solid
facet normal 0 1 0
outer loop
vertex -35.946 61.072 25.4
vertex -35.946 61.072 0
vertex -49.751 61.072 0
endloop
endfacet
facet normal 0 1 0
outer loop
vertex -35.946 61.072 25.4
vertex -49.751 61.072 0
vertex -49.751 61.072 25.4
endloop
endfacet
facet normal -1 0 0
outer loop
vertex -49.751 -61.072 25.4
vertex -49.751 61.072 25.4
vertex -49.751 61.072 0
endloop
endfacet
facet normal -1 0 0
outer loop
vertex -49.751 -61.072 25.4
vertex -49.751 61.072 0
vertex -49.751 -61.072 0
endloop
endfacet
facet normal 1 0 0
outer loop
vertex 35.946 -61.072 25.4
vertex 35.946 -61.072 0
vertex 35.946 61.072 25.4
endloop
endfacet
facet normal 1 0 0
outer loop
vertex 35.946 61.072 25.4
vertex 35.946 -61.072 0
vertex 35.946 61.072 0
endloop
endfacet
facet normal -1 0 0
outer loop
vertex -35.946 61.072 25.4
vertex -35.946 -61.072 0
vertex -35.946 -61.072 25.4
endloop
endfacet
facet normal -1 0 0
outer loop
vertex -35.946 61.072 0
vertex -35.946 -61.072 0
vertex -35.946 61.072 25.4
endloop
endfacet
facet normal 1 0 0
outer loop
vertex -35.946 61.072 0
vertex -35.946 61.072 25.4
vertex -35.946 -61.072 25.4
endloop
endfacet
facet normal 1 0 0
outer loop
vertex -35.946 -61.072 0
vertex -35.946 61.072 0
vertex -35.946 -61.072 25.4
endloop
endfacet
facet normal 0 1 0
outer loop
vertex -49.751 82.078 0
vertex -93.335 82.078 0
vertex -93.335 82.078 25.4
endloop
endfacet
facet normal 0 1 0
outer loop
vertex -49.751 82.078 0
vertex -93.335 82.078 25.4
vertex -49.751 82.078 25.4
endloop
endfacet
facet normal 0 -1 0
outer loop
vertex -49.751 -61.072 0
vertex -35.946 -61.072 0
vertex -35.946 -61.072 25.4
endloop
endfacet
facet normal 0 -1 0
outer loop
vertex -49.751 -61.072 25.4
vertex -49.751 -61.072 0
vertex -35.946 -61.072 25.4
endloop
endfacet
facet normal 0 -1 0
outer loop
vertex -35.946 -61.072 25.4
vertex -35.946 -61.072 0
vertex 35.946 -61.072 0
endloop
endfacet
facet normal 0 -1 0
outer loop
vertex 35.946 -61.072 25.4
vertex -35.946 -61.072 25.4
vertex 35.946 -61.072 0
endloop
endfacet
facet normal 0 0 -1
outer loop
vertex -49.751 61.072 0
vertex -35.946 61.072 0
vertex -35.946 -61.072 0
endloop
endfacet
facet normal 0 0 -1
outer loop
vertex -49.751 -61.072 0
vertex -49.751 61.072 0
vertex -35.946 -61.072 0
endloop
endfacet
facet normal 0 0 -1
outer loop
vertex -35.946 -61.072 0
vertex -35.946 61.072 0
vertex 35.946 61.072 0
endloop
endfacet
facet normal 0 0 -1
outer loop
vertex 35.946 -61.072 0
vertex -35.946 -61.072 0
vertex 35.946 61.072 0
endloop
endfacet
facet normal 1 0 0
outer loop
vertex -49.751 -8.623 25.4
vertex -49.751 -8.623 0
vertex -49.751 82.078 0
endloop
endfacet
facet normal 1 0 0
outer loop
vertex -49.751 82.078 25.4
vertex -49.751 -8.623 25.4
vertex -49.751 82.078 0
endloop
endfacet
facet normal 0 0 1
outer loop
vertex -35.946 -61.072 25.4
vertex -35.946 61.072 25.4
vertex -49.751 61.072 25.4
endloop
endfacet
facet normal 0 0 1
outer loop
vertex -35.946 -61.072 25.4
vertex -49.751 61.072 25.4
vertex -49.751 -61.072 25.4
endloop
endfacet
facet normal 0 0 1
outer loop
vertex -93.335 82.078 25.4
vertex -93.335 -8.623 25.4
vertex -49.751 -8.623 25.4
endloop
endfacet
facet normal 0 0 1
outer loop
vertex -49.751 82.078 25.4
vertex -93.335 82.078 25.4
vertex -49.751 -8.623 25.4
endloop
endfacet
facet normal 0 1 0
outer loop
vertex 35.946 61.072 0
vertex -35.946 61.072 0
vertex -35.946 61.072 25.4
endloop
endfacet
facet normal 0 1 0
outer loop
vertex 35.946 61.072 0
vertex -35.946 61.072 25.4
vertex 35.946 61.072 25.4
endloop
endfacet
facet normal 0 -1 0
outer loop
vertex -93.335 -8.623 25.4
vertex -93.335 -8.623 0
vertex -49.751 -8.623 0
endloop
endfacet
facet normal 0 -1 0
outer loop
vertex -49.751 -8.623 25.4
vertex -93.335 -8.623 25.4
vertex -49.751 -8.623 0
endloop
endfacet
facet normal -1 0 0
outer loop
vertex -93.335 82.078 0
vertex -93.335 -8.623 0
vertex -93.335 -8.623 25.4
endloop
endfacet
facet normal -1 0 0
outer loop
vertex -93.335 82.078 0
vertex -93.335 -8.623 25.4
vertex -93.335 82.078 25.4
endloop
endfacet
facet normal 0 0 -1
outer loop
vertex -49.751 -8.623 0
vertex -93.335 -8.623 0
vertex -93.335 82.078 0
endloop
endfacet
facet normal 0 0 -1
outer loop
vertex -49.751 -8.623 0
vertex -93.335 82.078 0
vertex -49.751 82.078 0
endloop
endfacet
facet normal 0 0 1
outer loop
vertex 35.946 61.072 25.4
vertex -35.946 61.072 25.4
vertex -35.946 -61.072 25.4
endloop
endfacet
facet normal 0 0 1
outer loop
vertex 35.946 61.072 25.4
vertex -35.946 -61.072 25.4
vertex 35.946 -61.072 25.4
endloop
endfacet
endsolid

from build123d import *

# Parameters (mm, degrees)
F0_W      = 43.584019
F0_H      = 90.701332
F0_W_2    = 71.89224
F0_H_2    = 122.143068
F1_DEPTH  = 25.4
F1_FACE_W = 122.143068
F1_FACE_H = 25.4
F2_DEPTH  = 13.804499


with BuildPart() as f1:
    # F0 (on Top) → F1 (new body)
    with BuildSketch(Plane.XY):
        with Locations((-71.542629, 36.727775)):
            Rectangle(F0_W, F0_H)
        Rectangle(F0_W_2, F0_H_2)
    extrude(amount=F1_DEPTH)


with BuildPart() as f2:
    # F1_face (on face) → F2 (new body, through all)
    with BuildSketch(Plane(origin=(-35.94612, 0, 12.7), x_dir=(0, -1, 0), z_dir=(-1, 0, 0))):
        Rectangle(F1_FACE_W, F1_FACE_H)
    extrude(amount=F2_DEPTH)


solid = Compound([f1.part, f2.part])
